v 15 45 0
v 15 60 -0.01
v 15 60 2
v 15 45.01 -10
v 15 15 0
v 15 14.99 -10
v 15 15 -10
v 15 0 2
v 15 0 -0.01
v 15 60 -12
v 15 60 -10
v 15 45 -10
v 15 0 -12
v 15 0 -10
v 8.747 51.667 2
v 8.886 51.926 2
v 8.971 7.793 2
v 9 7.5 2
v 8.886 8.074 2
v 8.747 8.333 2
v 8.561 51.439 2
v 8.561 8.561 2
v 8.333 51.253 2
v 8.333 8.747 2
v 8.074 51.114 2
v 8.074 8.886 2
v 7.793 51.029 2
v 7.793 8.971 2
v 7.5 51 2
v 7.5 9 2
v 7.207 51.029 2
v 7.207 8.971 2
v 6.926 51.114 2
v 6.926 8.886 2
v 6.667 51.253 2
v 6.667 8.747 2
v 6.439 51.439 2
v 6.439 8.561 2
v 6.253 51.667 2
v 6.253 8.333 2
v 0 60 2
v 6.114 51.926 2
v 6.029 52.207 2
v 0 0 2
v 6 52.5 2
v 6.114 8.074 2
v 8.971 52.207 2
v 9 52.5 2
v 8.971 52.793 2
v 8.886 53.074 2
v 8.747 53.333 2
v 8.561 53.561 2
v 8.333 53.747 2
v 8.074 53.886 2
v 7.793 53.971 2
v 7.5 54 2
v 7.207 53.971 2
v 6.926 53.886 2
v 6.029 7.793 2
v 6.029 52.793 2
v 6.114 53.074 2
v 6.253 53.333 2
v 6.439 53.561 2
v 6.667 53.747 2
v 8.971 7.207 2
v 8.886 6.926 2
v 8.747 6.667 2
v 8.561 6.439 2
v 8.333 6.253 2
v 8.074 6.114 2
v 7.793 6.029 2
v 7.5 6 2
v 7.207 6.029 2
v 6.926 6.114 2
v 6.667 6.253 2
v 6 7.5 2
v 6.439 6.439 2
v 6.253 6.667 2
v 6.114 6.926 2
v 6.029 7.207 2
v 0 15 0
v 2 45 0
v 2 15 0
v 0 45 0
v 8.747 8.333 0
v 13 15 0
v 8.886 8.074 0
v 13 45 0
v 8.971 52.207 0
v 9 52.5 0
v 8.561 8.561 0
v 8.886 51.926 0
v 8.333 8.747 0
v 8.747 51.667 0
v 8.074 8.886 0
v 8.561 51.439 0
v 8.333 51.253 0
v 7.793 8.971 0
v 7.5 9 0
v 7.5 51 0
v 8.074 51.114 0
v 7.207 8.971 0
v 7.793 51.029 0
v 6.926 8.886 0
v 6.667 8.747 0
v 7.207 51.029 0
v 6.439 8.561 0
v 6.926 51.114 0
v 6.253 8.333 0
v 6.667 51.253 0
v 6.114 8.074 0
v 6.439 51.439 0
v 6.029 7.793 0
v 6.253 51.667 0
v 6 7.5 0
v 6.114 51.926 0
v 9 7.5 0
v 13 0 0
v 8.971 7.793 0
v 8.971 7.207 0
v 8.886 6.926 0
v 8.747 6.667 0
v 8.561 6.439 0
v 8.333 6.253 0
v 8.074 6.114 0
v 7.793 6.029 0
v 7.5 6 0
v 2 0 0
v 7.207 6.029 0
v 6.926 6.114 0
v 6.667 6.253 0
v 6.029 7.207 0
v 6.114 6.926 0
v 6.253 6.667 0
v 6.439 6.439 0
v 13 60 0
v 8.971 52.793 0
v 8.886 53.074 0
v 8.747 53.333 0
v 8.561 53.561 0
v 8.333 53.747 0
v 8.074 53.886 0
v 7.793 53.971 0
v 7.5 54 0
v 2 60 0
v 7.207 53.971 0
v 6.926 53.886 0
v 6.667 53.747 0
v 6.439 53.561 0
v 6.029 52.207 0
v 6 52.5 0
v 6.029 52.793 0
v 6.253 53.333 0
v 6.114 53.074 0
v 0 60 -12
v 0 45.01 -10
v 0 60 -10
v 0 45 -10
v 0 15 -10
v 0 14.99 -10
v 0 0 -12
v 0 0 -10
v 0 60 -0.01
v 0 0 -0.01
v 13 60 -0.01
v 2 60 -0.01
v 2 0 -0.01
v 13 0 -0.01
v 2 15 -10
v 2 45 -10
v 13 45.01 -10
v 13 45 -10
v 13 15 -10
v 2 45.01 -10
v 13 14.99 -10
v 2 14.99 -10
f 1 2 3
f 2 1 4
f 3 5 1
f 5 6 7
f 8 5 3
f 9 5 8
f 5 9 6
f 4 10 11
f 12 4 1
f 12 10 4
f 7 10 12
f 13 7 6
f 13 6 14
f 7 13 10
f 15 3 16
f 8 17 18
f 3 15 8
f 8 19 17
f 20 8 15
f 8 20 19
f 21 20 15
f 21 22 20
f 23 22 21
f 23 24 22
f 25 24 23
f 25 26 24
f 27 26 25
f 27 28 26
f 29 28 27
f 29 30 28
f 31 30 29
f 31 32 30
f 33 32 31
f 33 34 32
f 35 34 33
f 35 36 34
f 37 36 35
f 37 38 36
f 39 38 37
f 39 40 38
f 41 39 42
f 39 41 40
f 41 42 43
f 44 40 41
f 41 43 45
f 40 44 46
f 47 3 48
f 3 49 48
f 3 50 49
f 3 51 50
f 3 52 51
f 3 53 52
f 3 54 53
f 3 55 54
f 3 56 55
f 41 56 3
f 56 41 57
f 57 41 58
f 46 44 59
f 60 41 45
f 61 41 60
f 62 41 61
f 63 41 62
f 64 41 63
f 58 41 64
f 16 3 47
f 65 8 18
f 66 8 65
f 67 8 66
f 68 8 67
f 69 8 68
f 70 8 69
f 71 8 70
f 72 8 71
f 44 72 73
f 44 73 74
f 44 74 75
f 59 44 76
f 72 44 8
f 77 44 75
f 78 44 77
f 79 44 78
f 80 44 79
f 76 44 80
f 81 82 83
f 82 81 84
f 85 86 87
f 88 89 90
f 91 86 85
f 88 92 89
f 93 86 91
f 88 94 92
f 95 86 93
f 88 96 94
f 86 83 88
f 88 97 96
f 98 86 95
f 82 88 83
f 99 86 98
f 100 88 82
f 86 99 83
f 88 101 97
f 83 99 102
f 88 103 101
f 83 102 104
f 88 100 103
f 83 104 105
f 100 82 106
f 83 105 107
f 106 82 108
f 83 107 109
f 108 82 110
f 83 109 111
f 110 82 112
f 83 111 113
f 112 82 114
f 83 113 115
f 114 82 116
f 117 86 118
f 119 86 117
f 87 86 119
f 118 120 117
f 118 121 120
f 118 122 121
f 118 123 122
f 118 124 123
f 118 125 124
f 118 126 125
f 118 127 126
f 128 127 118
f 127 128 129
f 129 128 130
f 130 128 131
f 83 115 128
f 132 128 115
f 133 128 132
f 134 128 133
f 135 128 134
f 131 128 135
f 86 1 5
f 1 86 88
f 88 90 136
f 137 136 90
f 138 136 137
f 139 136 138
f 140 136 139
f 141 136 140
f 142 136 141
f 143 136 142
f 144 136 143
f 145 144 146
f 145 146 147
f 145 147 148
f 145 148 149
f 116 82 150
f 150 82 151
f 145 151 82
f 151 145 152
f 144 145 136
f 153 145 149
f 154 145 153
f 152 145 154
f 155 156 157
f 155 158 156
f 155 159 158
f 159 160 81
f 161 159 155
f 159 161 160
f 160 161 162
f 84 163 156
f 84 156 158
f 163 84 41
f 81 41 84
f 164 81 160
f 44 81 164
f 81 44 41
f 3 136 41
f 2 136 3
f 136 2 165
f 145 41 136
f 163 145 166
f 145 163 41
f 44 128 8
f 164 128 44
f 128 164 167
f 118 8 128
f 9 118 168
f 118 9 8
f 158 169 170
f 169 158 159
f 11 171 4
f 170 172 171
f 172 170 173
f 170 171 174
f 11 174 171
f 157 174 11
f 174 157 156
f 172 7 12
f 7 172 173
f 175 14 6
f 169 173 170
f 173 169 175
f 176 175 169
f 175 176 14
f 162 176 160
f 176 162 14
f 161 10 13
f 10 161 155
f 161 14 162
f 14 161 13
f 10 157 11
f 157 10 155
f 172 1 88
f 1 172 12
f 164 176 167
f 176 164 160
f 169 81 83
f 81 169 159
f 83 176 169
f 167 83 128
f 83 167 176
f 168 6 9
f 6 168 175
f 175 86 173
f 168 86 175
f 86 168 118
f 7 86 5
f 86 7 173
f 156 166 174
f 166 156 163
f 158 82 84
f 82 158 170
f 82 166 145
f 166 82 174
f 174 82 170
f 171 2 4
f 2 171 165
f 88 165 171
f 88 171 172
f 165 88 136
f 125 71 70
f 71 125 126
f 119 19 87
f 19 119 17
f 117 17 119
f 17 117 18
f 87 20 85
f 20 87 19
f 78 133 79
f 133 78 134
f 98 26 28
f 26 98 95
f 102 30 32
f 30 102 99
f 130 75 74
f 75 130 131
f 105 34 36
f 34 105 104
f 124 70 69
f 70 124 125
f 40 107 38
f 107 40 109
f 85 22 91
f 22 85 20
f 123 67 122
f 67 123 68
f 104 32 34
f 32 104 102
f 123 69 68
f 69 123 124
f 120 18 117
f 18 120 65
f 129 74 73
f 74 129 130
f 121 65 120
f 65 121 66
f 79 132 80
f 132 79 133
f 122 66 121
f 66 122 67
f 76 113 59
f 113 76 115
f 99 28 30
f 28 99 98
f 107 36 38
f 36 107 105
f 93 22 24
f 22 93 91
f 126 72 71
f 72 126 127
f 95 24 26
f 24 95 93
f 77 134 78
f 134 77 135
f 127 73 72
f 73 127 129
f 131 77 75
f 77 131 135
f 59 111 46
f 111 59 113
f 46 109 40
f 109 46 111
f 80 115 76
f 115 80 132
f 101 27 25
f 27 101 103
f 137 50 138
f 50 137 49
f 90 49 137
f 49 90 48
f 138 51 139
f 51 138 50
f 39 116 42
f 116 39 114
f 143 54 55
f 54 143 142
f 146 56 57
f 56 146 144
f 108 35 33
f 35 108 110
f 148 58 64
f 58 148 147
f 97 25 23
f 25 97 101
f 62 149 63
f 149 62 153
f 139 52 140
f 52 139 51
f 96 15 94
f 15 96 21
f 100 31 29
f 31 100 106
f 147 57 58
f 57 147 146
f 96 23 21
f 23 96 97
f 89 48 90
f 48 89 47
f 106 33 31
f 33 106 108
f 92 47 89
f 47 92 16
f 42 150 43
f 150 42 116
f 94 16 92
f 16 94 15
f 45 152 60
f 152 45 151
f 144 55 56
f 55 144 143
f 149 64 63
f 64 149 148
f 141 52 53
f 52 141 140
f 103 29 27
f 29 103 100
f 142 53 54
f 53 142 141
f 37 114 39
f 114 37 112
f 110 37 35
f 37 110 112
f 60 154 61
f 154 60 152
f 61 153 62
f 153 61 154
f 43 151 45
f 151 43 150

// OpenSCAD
// Wire holder: two overhangs with triangular gussets connected by a bridge
// Based on 8bitdo_v013 overhang/gusset dimensions

// Overhang dimensions (from 8bitdo reference)
overhang_width = 15;
overhang_length = 15;
overhang_thickness = 2;

// Gusset dimensions
gusset_thickness = 2;
gusset_height = 10;

// Screw hole
screw_hole_d = 3;

// Bridge dimensions
bridge_span = 30;       // distance between the two overhangs
bridge_thickness = 2;
bridge_width = 15;      // same as overhang_width

// Mounting plate (attaches to surface, connects both overhangs)
plate_width = overhang_width;
plate_length = bridge_span + 2 * overhang_length;
plate_thickness = overhang_thickness;

// Gusset module: right-triangle brace
module gusset(length, height, thickness) {
    hull() {
        cube([thickness, 0.01, height]);
        translate([0, length - 0.01, height - 0.01])
            cube([thickness, 0.01, 0.01]);
    }
}

difference() {
    union() {
        // Mounting plate (flat against surface, e.g. underside of desk)
        cube([plate_width, plate_length, plate_thickness]);

        // Left overhang (extends down from plate)
        translate([0, 0, -gusset_height - bridge_thickness])
            cube([overhang_width, overhang_length, bridge_thickness]);

        // Right overhang (extends down from plate)
        translate([0, plate_length - overhang_length, -gusset_height - bridge_thickness])
            cube([overhang_width, overhang_length, bridge_thickness]);

        // Bridge connecting the two overhangs
        translate([0, overhang_length, -gusset_height - bridge_thickness])
            cube([bridge_width, bridge_span, bridge_thickness]);

        // Gussets - left overhang (two gussets at each edge of the overhang width)
        translate([0, overhang_length, -gusset_height])
            mirror([0, 1, 0])
                gusset(overhang_length, gusset_height, gusset_thickness);
        translate([overhang_width - gusset_thickness, overhang_length, -gusset_height])
            mirror([0, 1, 0])
                gusset(overhang_length, gusset_height, gusset_thickness);

        // Gussets - right overhang (two gussets at each edge of the overhang width)
        translate([0, plate_length - overhang_length, -gusset_height])
            gusset(overhang_length, gusset_height, gusset_thickness);
        translate([overhang_width - gusset_thickness, plate_length - overhang_length, -gusset_height])
            gusset(overhang_length, gusset_height, gusset_thickness);
    }

    // Screw holes in mounting plate
    translate([plate_width / 2, overhang_length / 2, -1])
        cylinder(h = plate_thickness + 2, d = screw_hole_d, $fn = 32);
    translate([plate_width / 2, plate_length - overhang_length / 2, -1])
        cylinder(h = plate_thickness + 2, d = screw_hole_d, $fn = 32);
}
